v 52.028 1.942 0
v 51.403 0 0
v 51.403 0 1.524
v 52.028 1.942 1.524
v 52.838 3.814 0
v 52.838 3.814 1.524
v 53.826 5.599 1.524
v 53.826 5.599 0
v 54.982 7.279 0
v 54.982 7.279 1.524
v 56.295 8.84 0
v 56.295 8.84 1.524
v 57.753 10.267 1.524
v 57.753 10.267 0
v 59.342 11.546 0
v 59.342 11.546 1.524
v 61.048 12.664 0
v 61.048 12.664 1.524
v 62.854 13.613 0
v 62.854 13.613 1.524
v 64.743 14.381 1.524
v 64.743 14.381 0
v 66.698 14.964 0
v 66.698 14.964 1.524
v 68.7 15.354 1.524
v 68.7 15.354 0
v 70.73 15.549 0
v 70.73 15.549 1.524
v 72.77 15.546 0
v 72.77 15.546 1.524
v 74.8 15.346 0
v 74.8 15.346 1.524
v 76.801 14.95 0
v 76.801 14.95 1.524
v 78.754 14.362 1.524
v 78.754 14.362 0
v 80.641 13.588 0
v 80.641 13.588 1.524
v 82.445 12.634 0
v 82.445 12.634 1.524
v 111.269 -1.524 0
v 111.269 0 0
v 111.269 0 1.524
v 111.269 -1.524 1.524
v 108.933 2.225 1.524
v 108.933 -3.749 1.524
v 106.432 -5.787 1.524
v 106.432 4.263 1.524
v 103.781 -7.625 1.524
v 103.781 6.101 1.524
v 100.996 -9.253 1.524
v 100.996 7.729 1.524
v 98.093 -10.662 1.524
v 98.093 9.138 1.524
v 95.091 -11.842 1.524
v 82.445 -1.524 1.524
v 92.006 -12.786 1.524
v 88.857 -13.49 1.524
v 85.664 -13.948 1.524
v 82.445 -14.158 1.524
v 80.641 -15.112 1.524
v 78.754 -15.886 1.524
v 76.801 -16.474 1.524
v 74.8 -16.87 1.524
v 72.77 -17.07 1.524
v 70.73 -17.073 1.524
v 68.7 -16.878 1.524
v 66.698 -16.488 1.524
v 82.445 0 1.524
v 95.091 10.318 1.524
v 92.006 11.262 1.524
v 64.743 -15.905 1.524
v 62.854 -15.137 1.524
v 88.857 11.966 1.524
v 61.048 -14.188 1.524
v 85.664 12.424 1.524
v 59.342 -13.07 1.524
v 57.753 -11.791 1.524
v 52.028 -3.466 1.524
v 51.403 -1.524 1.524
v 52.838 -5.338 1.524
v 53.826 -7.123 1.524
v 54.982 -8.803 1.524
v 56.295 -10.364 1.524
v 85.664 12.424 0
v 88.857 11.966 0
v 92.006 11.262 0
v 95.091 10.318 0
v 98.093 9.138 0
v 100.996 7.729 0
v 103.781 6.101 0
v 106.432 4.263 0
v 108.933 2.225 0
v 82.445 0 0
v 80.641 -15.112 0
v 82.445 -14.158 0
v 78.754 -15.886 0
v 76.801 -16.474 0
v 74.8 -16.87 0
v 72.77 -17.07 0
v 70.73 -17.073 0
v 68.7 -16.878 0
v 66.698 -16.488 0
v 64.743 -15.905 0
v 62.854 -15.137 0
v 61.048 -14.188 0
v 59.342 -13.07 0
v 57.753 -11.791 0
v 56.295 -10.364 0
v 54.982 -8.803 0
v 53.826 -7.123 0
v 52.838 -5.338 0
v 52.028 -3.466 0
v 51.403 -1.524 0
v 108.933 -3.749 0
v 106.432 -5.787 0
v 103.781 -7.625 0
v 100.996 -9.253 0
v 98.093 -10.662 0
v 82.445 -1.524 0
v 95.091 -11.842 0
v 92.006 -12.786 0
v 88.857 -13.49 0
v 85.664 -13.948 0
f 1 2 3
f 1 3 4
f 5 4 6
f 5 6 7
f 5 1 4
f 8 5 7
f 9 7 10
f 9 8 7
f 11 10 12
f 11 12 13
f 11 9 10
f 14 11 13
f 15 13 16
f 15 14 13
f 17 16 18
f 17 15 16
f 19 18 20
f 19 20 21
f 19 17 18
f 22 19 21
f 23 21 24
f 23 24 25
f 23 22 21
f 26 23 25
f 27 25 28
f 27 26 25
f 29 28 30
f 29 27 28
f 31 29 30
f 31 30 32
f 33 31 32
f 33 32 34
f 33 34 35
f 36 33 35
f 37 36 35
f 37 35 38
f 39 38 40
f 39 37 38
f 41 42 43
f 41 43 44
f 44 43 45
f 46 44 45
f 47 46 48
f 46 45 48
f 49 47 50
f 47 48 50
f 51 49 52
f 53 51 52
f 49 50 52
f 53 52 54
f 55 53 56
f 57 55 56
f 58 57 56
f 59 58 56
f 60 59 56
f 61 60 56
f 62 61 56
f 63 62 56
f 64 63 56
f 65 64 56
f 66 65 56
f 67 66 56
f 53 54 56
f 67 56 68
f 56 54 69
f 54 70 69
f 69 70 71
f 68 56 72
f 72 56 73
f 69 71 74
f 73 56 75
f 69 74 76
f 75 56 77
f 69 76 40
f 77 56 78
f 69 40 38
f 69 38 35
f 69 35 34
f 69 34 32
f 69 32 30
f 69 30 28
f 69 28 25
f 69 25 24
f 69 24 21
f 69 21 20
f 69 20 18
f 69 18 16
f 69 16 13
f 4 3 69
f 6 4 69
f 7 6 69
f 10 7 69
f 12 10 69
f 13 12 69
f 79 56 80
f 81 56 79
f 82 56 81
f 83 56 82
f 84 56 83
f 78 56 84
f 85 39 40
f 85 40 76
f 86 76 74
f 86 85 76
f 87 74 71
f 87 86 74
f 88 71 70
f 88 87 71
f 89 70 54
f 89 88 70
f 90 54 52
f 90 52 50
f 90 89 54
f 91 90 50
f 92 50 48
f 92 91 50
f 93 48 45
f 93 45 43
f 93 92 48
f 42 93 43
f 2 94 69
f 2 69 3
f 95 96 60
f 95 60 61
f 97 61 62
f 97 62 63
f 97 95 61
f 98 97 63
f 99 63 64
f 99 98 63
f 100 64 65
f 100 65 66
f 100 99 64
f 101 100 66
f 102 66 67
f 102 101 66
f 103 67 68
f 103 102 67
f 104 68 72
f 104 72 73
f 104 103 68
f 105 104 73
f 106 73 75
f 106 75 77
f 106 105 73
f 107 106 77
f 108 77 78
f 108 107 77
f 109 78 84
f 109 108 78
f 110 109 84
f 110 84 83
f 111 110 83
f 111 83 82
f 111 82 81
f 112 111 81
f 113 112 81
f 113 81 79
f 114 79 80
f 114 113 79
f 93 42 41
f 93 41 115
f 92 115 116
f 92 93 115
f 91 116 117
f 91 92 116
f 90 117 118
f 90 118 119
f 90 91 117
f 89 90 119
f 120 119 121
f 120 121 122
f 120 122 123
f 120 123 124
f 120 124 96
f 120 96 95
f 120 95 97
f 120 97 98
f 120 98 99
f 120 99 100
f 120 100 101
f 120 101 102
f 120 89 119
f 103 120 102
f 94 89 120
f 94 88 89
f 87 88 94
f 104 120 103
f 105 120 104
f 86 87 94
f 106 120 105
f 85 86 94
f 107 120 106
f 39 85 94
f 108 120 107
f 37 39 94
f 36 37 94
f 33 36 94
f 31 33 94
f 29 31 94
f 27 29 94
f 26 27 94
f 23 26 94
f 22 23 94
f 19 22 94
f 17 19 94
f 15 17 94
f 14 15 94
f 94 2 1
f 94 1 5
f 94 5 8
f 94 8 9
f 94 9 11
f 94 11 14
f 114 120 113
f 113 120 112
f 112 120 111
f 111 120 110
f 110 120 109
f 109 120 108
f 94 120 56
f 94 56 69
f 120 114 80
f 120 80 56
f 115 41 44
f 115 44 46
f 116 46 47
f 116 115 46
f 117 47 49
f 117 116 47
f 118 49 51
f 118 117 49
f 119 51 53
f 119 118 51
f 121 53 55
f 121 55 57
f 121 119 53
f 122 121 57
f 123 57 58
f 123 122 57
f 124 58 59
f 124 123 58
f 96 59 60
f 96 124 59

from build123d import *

# Parameters (mm, degrees)
BOSS_EXTRUDE1_DEPTH = 1.524


with BuildPart() as part:
    # Sketch1 → Boss-Extrude1 (new body)
    with BuildSketch(Plane.XY):
        with BuildLine():
            Line((82.44470135, -1.524), (82.44470135, 0))
            Line((82.44470135, 0), (51.403450054, 0))
            ThreePointArc((51.403450054, 0), (63.788927887, 14.019916875), (82.44470135, 12.634187153))
            ThreePointArc((82.44470135, 12.634187153), (98.093428139, 9.137765846), (111.269499156, 0))
            Line((111.269499156, 0), (111.269499156, -1.524))
            ThreePointArc((111.269499156, -1.524), (98.093428139, -10.661765846), (82.44470135, -14.158187153))
            ThreePointArc((82.44470135, -14.158187153), (63.788927887, -15.543916875), (51.403450054, -1.524))
            Line((51.403450054, -1.524), (82.44470135, -1.524))
        make_face()
    extrude(amount=BOSS_EXTRUDE1_DEPTH)


solid = part.part
